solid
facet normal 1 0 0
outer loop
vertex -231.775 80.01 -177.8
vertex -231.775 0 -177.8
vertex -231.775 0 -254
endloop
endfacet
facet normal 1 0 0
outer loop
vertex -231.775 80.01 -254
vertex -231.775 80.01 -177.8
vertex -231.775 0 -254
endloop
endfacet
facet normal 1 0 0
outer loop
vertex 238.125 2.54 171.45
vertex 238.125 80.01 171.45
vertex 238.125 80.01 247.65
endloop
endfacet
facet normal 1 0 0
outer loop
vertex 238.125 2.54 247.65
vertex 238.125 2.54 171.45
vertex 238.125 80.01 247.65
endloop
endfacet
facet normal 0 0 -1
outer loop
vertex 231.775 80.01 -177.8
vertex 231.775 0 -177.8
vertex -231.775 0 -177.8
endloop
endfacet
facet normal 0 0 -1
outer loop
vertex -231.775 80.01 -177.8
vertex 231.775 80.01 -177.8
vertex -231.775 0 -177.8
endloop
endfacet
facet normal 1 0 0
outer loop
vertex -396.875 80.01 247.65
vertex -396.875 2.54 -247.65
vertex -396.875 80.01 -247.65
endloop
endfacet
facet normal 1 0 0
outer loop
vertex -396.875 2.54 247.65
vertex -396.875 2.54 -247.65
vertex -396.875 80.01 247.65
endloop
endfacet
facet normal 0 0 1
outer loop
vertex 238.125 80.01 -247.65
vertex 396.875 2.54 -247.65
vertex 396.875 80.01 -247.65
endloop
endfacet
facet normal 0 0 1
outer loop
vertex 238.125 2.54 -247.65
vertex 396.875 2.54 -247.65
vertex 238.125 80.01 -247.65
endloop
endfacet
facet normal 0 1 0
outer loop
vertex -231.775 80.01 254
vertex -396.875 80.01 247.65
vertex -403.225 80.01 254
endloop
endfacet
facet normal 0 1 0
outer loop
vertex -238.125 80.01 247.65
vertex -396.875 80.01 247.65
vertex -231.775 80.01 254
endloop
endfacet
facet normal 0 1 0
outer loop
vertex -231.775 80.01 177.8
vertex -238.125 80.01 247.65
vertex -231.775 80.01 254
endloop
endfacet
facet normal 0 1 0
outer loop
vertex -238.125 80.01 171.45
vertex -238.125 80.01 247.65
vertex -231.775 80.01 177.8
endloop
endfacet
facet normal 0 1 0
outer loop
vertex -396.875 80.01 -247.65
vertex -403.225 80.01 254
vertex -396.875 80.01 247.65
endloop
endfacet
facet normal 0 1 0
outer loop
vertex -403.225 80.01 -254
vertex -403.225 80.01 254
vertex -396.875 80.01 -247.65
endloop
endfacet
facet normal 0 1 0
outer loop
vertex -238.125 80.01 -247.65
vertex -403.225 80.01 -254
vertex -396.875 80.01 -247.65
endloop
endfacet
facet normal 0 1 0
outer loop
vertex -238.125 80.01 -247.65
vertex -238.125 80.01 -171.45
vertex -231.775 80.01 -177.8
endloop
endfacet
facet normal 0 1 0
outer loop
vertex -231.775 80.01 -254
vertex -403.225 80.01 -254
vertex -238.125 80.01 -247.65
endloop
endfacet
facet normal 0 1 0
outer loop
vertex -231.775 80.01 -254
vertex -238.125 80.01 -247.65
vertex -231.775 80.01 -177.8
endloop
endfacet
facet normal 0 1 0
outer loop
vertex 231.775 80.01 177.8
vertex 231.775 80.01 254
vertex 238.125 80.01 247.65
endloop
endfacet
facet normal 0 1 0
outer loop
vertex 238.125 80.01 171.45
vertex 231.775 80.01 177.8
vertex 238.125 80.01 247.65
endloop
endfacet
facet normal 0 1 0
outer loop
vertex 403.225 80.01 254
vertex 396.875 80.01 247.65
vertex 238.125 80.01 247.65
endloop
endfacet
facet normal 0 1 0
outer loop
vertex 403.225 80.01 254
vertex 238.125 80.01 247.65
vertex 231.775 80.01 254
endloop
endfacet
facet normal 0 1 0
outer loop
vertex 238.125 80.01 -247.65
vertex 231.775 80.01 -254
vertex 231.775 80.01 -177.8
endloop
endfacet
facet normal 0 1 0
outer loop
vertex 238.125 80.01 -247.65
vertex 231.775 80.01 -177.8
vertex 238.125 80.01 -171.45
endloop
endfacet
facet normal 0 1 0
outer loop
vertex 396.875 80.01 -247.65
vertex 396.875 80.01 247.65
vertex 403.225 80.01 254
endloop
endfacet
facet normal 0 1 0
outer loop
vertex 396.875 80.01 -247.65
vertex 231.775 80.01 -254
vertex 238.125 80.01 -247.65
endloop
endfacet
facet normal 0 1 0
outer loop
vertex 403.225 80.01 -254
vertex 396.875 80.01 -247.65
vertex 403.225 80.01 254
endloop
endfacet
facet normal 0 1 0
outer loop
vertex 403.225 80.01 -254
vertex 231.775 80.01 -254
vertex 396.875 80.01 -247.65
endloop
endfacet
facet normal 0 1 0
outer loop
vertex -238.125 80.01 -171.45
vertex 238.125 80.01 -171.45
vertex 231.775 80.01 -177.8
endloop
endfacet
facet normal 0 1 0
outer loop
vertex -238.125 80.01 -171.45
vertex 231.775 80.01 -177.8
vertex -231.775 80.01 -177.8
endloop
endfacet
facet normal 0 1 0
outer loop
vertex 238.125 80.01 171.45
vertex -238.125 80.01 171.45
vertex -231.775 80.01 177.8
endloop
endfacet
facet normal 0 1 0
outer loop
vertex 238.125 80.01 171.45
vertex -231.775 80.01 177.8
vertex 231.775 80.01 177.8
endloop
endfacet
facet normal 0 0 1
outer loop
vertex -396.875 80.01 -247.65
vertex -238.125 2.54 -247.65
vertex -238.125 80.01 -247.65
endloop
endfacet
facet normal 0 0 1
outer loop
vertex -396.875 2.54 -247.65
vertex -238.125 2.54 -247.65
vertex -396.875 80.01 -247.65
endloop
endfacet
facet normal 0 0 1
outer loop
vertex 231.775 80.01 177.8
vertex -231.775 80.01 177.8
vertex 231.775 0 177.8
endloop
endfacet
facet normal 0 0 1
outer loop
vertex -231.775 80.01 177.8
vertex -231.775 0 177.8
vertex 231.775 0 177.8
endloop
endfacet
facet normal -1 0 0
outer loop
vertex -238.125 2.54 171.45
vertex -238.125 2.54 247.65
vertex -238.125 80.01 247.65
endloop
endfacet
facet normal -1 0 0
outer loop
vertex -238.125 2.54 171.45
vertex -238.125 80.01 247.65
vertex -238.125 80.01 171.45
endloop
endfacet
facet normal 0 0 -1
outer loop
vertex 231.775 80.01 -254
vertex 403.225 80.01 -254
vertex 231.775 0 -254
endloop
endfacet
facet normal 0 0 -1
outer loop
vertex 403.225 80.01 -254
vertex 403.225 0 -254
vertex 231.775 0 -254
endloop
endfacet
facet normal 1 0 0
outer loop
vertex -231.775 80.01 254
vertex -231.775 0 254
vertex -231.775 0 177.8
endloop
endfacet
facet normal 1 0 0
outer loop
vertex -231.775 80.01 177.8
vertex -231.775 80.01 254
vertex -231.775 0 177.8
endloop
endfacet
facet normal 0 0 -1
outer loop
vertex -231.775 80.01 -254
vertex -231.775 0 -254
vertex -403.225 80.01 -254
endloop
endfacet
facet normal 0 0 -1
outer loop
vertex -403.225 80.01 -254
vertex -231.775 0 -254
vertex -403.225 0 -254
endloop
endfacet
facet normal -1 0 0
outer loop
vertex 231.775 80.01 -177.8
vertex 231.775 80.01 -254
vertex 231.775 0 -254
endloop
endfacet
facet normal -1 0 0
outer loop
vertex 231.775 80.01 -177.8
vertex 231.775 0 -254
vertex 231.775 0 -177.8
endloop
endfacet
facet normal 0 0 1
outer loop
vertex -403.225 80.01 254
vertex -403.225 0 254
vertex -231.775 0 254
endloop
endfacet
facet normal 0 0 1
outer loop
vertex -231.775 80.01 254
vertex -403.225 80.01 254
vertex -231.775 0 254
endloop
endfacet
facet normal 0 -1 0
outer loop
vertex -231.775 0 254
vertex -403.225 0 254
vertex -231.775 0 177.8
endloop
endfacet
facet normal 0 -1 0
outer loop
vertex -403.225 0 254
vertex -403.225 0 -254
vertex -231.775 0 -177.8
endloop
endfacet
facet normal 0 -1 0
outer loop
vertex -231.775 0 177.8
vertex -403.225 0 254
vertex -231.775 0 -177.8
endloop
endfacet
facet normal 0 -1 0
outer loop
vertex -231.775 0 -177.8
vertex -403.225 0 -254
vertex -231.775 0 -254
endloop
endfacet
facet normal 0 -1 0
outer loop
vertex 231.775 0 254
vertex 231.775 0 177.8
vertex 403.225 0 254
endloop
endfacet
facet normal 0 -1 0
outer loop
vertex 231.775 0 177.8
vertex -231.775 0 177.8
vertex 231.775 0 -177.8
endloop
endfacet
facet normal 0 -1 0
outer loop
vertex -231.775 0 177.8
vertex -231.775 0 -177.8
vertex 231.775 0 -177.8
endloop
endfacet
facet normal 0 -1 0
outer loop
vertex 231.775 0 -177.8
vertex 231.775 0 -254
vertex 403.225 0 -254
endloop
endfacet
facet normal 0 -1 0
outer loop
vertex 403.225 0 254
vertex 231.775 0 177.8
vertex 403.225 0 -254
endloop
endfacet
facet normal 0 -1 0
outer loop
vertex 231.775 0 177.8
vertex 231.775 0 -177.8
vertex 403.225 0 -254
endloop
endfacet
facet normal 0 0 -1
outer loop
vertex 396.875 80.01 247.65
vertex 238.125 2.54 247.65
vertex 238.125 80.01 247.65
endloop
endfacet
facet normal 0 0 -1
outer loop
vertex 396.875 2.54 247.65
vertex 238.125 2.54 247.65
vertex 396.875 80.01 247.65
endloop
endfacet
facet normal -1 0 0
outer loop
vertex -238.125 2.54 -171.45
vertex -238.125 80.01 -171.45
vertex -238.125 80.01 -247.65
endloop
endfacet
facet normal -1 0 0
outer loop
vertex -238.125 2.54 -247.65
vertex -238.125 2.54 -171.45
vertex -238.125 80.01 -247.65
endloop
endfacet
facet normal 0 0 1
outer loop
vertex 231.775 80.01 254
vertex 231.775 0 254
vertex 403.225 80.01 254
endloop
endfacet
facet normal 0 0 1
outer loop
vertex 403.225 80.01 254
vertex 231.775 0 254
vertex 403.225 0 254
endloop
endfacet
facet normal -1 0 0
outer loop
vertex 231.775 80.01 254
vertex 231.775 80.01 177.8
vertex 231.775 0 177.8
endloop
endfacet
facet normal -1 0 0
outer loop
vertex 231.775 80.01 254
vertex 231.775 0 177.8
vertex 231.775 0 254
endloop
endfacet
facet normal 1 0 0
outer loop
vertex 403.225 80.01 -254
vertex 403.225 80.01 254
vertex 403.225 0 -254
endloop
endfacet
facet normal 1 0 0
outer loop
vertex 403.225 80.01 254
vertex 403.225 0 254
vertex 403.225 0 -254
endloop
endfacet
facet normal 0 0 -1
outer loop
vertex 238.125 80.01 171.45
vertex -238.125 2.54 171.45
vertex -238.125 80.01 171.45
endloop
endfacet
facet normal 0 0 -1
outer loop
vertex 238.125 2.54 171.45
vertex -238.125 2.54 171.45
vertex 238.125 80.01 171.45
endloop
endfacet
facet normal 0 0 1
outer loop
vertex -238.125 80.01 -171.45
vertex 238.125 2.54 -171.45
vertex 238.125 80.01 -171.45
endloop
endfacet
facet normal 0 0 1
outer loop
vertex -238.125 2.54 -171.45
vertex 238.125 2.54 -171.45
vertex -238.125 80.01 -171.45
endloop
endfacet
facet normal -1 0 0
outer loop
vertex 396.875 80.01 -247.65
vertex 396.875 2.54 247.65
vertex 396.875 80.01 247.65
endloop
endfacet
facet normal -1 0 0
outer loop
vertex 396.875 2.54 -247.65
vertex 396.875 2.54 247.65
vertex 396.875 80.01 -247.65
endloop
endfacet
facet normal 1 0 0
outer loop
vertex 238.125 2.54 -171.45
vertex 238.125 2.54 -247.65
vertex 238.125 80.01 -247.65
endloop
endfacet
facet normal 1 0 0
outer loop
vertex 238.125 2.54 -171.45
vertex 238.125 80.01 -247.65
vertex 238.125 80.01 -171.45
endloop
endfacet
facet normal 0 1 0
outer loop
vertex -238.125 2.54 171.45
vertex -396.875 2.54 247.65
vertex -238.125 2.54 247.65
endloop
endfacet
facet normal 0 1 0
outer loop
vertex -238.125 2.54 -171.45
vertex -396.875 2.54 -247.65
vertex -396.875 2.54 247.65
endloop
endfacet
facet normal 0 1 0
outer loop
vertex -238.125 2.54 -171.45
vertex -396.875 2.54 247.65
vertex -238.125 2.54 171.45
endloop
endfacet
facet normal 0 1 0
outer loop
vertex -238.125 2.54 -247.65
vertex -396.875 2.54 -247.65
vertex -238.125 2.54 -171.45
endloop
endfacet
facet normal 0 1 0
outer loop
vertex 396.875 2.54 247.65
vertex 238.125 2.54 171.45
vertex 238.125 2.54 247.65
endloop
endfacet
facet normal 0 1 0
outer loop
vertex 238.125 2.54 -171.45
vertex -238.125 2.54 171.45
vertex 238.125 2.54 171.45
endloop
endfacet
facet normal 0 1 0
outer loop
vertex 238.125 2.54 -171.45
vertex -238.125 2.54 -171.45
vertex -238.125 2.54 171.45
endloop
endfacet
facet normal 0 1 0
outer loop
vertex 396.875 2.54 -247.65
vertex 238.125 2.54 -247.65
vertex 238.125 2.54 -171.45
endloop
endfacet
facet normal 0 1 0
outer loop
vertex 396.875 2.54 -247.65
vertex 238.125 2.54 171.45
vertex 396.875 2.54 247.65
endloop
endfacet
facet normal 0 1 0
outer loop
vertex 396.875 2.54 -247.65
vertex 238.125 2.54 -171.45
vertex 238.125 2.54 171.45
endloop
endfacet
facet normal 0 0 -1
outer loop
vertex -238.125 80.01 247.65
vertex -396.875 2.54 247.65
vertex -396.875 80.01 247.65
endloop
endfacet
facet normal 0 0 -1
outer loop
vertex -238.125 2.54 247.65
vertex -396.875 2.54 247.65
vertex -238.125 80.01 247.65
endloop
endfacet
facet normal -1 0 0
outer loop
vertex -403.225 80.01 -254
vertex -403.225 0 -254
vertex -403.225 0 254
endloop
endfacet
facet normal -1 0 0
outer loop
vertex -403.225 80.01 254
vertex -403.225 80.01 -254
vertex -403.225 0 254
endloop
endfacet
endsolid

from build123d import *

# Parameters (mm, degrees)
SKETCH1_W           = 806.45
SKETCH1_H           = 508
BOSS_EXTRUDE1_DEPTH = 2.54
SKETCH2_W           = 463.55
SKETCH2_H           = 76.2
CUT_EXTRUDE1_DEPTH  = 2.54
BOSS_EXTRUDE2_DEPTH = 77.47


with BuildPart() as part:
    # Sketch1 → Boss-Extrude1 (new body)
    with BuildSketch(Plane(origin=(0, 0, 0), x_dir=(1, 0, 0), z_dir=(0, 1, 0))):
        Rectangle(SKETCH1_W, SKETCH1_H)
    extrude(amount=BOSS_EXTRUDE1_DEPTH)

    # Sketch2 → Cut-Extrude1 (cut)
    with BuildSketch(Plane(origin=(0, 2.54, 0), x_dir=(1, 0, 0), z_dir=(0, 1, 0))):
        with Locations((0, -215.9)):
            Rectangle(SKETCH2_W, SKETCH2_H)
        with Locations((0, 215.9)):
            Rectangle(SKETCH2_W, SKETCH2_H)
    extrude(amount=-CUT_EXTRUDE1_DEPTH, mode=Mode.SUBTRACT)

    # Sketch3 → Boss-Extrude2 (add)
    with BuildSketch(Plane(origin=(0, 2.54, 0), x_dir=(1, 0, 0), z_dir=(0, 1, 0))):
        Polygon((-231.775, -254), (-231.775, -177.8), (231.775, -177.8), (231.775, -254), (403.225, -254), (403.225, 254), (231.775, 254), (231.775, 177.8), (-231.775, 177.8), (-231.775, 254), (-403.225, 254), (-403.225, -254), align=None)
        Polygon((238.125, 171.45), (-238.125, 171.45), (-238.125, 247.65), (-396.875, 247.65), (-396.875, -247.65), (-238.125, -247.65), (-238.125, -171.45), (238.125, -171.45), (238.125, -247.65), (396.875, -247.65), (396.875, 247.65), (238.125, 247.65), align=None, mode=Mode.SUBTRACT)
    extrude(amount=BOSS_EXTRUDE2_DEPTH)


solid = part.part
